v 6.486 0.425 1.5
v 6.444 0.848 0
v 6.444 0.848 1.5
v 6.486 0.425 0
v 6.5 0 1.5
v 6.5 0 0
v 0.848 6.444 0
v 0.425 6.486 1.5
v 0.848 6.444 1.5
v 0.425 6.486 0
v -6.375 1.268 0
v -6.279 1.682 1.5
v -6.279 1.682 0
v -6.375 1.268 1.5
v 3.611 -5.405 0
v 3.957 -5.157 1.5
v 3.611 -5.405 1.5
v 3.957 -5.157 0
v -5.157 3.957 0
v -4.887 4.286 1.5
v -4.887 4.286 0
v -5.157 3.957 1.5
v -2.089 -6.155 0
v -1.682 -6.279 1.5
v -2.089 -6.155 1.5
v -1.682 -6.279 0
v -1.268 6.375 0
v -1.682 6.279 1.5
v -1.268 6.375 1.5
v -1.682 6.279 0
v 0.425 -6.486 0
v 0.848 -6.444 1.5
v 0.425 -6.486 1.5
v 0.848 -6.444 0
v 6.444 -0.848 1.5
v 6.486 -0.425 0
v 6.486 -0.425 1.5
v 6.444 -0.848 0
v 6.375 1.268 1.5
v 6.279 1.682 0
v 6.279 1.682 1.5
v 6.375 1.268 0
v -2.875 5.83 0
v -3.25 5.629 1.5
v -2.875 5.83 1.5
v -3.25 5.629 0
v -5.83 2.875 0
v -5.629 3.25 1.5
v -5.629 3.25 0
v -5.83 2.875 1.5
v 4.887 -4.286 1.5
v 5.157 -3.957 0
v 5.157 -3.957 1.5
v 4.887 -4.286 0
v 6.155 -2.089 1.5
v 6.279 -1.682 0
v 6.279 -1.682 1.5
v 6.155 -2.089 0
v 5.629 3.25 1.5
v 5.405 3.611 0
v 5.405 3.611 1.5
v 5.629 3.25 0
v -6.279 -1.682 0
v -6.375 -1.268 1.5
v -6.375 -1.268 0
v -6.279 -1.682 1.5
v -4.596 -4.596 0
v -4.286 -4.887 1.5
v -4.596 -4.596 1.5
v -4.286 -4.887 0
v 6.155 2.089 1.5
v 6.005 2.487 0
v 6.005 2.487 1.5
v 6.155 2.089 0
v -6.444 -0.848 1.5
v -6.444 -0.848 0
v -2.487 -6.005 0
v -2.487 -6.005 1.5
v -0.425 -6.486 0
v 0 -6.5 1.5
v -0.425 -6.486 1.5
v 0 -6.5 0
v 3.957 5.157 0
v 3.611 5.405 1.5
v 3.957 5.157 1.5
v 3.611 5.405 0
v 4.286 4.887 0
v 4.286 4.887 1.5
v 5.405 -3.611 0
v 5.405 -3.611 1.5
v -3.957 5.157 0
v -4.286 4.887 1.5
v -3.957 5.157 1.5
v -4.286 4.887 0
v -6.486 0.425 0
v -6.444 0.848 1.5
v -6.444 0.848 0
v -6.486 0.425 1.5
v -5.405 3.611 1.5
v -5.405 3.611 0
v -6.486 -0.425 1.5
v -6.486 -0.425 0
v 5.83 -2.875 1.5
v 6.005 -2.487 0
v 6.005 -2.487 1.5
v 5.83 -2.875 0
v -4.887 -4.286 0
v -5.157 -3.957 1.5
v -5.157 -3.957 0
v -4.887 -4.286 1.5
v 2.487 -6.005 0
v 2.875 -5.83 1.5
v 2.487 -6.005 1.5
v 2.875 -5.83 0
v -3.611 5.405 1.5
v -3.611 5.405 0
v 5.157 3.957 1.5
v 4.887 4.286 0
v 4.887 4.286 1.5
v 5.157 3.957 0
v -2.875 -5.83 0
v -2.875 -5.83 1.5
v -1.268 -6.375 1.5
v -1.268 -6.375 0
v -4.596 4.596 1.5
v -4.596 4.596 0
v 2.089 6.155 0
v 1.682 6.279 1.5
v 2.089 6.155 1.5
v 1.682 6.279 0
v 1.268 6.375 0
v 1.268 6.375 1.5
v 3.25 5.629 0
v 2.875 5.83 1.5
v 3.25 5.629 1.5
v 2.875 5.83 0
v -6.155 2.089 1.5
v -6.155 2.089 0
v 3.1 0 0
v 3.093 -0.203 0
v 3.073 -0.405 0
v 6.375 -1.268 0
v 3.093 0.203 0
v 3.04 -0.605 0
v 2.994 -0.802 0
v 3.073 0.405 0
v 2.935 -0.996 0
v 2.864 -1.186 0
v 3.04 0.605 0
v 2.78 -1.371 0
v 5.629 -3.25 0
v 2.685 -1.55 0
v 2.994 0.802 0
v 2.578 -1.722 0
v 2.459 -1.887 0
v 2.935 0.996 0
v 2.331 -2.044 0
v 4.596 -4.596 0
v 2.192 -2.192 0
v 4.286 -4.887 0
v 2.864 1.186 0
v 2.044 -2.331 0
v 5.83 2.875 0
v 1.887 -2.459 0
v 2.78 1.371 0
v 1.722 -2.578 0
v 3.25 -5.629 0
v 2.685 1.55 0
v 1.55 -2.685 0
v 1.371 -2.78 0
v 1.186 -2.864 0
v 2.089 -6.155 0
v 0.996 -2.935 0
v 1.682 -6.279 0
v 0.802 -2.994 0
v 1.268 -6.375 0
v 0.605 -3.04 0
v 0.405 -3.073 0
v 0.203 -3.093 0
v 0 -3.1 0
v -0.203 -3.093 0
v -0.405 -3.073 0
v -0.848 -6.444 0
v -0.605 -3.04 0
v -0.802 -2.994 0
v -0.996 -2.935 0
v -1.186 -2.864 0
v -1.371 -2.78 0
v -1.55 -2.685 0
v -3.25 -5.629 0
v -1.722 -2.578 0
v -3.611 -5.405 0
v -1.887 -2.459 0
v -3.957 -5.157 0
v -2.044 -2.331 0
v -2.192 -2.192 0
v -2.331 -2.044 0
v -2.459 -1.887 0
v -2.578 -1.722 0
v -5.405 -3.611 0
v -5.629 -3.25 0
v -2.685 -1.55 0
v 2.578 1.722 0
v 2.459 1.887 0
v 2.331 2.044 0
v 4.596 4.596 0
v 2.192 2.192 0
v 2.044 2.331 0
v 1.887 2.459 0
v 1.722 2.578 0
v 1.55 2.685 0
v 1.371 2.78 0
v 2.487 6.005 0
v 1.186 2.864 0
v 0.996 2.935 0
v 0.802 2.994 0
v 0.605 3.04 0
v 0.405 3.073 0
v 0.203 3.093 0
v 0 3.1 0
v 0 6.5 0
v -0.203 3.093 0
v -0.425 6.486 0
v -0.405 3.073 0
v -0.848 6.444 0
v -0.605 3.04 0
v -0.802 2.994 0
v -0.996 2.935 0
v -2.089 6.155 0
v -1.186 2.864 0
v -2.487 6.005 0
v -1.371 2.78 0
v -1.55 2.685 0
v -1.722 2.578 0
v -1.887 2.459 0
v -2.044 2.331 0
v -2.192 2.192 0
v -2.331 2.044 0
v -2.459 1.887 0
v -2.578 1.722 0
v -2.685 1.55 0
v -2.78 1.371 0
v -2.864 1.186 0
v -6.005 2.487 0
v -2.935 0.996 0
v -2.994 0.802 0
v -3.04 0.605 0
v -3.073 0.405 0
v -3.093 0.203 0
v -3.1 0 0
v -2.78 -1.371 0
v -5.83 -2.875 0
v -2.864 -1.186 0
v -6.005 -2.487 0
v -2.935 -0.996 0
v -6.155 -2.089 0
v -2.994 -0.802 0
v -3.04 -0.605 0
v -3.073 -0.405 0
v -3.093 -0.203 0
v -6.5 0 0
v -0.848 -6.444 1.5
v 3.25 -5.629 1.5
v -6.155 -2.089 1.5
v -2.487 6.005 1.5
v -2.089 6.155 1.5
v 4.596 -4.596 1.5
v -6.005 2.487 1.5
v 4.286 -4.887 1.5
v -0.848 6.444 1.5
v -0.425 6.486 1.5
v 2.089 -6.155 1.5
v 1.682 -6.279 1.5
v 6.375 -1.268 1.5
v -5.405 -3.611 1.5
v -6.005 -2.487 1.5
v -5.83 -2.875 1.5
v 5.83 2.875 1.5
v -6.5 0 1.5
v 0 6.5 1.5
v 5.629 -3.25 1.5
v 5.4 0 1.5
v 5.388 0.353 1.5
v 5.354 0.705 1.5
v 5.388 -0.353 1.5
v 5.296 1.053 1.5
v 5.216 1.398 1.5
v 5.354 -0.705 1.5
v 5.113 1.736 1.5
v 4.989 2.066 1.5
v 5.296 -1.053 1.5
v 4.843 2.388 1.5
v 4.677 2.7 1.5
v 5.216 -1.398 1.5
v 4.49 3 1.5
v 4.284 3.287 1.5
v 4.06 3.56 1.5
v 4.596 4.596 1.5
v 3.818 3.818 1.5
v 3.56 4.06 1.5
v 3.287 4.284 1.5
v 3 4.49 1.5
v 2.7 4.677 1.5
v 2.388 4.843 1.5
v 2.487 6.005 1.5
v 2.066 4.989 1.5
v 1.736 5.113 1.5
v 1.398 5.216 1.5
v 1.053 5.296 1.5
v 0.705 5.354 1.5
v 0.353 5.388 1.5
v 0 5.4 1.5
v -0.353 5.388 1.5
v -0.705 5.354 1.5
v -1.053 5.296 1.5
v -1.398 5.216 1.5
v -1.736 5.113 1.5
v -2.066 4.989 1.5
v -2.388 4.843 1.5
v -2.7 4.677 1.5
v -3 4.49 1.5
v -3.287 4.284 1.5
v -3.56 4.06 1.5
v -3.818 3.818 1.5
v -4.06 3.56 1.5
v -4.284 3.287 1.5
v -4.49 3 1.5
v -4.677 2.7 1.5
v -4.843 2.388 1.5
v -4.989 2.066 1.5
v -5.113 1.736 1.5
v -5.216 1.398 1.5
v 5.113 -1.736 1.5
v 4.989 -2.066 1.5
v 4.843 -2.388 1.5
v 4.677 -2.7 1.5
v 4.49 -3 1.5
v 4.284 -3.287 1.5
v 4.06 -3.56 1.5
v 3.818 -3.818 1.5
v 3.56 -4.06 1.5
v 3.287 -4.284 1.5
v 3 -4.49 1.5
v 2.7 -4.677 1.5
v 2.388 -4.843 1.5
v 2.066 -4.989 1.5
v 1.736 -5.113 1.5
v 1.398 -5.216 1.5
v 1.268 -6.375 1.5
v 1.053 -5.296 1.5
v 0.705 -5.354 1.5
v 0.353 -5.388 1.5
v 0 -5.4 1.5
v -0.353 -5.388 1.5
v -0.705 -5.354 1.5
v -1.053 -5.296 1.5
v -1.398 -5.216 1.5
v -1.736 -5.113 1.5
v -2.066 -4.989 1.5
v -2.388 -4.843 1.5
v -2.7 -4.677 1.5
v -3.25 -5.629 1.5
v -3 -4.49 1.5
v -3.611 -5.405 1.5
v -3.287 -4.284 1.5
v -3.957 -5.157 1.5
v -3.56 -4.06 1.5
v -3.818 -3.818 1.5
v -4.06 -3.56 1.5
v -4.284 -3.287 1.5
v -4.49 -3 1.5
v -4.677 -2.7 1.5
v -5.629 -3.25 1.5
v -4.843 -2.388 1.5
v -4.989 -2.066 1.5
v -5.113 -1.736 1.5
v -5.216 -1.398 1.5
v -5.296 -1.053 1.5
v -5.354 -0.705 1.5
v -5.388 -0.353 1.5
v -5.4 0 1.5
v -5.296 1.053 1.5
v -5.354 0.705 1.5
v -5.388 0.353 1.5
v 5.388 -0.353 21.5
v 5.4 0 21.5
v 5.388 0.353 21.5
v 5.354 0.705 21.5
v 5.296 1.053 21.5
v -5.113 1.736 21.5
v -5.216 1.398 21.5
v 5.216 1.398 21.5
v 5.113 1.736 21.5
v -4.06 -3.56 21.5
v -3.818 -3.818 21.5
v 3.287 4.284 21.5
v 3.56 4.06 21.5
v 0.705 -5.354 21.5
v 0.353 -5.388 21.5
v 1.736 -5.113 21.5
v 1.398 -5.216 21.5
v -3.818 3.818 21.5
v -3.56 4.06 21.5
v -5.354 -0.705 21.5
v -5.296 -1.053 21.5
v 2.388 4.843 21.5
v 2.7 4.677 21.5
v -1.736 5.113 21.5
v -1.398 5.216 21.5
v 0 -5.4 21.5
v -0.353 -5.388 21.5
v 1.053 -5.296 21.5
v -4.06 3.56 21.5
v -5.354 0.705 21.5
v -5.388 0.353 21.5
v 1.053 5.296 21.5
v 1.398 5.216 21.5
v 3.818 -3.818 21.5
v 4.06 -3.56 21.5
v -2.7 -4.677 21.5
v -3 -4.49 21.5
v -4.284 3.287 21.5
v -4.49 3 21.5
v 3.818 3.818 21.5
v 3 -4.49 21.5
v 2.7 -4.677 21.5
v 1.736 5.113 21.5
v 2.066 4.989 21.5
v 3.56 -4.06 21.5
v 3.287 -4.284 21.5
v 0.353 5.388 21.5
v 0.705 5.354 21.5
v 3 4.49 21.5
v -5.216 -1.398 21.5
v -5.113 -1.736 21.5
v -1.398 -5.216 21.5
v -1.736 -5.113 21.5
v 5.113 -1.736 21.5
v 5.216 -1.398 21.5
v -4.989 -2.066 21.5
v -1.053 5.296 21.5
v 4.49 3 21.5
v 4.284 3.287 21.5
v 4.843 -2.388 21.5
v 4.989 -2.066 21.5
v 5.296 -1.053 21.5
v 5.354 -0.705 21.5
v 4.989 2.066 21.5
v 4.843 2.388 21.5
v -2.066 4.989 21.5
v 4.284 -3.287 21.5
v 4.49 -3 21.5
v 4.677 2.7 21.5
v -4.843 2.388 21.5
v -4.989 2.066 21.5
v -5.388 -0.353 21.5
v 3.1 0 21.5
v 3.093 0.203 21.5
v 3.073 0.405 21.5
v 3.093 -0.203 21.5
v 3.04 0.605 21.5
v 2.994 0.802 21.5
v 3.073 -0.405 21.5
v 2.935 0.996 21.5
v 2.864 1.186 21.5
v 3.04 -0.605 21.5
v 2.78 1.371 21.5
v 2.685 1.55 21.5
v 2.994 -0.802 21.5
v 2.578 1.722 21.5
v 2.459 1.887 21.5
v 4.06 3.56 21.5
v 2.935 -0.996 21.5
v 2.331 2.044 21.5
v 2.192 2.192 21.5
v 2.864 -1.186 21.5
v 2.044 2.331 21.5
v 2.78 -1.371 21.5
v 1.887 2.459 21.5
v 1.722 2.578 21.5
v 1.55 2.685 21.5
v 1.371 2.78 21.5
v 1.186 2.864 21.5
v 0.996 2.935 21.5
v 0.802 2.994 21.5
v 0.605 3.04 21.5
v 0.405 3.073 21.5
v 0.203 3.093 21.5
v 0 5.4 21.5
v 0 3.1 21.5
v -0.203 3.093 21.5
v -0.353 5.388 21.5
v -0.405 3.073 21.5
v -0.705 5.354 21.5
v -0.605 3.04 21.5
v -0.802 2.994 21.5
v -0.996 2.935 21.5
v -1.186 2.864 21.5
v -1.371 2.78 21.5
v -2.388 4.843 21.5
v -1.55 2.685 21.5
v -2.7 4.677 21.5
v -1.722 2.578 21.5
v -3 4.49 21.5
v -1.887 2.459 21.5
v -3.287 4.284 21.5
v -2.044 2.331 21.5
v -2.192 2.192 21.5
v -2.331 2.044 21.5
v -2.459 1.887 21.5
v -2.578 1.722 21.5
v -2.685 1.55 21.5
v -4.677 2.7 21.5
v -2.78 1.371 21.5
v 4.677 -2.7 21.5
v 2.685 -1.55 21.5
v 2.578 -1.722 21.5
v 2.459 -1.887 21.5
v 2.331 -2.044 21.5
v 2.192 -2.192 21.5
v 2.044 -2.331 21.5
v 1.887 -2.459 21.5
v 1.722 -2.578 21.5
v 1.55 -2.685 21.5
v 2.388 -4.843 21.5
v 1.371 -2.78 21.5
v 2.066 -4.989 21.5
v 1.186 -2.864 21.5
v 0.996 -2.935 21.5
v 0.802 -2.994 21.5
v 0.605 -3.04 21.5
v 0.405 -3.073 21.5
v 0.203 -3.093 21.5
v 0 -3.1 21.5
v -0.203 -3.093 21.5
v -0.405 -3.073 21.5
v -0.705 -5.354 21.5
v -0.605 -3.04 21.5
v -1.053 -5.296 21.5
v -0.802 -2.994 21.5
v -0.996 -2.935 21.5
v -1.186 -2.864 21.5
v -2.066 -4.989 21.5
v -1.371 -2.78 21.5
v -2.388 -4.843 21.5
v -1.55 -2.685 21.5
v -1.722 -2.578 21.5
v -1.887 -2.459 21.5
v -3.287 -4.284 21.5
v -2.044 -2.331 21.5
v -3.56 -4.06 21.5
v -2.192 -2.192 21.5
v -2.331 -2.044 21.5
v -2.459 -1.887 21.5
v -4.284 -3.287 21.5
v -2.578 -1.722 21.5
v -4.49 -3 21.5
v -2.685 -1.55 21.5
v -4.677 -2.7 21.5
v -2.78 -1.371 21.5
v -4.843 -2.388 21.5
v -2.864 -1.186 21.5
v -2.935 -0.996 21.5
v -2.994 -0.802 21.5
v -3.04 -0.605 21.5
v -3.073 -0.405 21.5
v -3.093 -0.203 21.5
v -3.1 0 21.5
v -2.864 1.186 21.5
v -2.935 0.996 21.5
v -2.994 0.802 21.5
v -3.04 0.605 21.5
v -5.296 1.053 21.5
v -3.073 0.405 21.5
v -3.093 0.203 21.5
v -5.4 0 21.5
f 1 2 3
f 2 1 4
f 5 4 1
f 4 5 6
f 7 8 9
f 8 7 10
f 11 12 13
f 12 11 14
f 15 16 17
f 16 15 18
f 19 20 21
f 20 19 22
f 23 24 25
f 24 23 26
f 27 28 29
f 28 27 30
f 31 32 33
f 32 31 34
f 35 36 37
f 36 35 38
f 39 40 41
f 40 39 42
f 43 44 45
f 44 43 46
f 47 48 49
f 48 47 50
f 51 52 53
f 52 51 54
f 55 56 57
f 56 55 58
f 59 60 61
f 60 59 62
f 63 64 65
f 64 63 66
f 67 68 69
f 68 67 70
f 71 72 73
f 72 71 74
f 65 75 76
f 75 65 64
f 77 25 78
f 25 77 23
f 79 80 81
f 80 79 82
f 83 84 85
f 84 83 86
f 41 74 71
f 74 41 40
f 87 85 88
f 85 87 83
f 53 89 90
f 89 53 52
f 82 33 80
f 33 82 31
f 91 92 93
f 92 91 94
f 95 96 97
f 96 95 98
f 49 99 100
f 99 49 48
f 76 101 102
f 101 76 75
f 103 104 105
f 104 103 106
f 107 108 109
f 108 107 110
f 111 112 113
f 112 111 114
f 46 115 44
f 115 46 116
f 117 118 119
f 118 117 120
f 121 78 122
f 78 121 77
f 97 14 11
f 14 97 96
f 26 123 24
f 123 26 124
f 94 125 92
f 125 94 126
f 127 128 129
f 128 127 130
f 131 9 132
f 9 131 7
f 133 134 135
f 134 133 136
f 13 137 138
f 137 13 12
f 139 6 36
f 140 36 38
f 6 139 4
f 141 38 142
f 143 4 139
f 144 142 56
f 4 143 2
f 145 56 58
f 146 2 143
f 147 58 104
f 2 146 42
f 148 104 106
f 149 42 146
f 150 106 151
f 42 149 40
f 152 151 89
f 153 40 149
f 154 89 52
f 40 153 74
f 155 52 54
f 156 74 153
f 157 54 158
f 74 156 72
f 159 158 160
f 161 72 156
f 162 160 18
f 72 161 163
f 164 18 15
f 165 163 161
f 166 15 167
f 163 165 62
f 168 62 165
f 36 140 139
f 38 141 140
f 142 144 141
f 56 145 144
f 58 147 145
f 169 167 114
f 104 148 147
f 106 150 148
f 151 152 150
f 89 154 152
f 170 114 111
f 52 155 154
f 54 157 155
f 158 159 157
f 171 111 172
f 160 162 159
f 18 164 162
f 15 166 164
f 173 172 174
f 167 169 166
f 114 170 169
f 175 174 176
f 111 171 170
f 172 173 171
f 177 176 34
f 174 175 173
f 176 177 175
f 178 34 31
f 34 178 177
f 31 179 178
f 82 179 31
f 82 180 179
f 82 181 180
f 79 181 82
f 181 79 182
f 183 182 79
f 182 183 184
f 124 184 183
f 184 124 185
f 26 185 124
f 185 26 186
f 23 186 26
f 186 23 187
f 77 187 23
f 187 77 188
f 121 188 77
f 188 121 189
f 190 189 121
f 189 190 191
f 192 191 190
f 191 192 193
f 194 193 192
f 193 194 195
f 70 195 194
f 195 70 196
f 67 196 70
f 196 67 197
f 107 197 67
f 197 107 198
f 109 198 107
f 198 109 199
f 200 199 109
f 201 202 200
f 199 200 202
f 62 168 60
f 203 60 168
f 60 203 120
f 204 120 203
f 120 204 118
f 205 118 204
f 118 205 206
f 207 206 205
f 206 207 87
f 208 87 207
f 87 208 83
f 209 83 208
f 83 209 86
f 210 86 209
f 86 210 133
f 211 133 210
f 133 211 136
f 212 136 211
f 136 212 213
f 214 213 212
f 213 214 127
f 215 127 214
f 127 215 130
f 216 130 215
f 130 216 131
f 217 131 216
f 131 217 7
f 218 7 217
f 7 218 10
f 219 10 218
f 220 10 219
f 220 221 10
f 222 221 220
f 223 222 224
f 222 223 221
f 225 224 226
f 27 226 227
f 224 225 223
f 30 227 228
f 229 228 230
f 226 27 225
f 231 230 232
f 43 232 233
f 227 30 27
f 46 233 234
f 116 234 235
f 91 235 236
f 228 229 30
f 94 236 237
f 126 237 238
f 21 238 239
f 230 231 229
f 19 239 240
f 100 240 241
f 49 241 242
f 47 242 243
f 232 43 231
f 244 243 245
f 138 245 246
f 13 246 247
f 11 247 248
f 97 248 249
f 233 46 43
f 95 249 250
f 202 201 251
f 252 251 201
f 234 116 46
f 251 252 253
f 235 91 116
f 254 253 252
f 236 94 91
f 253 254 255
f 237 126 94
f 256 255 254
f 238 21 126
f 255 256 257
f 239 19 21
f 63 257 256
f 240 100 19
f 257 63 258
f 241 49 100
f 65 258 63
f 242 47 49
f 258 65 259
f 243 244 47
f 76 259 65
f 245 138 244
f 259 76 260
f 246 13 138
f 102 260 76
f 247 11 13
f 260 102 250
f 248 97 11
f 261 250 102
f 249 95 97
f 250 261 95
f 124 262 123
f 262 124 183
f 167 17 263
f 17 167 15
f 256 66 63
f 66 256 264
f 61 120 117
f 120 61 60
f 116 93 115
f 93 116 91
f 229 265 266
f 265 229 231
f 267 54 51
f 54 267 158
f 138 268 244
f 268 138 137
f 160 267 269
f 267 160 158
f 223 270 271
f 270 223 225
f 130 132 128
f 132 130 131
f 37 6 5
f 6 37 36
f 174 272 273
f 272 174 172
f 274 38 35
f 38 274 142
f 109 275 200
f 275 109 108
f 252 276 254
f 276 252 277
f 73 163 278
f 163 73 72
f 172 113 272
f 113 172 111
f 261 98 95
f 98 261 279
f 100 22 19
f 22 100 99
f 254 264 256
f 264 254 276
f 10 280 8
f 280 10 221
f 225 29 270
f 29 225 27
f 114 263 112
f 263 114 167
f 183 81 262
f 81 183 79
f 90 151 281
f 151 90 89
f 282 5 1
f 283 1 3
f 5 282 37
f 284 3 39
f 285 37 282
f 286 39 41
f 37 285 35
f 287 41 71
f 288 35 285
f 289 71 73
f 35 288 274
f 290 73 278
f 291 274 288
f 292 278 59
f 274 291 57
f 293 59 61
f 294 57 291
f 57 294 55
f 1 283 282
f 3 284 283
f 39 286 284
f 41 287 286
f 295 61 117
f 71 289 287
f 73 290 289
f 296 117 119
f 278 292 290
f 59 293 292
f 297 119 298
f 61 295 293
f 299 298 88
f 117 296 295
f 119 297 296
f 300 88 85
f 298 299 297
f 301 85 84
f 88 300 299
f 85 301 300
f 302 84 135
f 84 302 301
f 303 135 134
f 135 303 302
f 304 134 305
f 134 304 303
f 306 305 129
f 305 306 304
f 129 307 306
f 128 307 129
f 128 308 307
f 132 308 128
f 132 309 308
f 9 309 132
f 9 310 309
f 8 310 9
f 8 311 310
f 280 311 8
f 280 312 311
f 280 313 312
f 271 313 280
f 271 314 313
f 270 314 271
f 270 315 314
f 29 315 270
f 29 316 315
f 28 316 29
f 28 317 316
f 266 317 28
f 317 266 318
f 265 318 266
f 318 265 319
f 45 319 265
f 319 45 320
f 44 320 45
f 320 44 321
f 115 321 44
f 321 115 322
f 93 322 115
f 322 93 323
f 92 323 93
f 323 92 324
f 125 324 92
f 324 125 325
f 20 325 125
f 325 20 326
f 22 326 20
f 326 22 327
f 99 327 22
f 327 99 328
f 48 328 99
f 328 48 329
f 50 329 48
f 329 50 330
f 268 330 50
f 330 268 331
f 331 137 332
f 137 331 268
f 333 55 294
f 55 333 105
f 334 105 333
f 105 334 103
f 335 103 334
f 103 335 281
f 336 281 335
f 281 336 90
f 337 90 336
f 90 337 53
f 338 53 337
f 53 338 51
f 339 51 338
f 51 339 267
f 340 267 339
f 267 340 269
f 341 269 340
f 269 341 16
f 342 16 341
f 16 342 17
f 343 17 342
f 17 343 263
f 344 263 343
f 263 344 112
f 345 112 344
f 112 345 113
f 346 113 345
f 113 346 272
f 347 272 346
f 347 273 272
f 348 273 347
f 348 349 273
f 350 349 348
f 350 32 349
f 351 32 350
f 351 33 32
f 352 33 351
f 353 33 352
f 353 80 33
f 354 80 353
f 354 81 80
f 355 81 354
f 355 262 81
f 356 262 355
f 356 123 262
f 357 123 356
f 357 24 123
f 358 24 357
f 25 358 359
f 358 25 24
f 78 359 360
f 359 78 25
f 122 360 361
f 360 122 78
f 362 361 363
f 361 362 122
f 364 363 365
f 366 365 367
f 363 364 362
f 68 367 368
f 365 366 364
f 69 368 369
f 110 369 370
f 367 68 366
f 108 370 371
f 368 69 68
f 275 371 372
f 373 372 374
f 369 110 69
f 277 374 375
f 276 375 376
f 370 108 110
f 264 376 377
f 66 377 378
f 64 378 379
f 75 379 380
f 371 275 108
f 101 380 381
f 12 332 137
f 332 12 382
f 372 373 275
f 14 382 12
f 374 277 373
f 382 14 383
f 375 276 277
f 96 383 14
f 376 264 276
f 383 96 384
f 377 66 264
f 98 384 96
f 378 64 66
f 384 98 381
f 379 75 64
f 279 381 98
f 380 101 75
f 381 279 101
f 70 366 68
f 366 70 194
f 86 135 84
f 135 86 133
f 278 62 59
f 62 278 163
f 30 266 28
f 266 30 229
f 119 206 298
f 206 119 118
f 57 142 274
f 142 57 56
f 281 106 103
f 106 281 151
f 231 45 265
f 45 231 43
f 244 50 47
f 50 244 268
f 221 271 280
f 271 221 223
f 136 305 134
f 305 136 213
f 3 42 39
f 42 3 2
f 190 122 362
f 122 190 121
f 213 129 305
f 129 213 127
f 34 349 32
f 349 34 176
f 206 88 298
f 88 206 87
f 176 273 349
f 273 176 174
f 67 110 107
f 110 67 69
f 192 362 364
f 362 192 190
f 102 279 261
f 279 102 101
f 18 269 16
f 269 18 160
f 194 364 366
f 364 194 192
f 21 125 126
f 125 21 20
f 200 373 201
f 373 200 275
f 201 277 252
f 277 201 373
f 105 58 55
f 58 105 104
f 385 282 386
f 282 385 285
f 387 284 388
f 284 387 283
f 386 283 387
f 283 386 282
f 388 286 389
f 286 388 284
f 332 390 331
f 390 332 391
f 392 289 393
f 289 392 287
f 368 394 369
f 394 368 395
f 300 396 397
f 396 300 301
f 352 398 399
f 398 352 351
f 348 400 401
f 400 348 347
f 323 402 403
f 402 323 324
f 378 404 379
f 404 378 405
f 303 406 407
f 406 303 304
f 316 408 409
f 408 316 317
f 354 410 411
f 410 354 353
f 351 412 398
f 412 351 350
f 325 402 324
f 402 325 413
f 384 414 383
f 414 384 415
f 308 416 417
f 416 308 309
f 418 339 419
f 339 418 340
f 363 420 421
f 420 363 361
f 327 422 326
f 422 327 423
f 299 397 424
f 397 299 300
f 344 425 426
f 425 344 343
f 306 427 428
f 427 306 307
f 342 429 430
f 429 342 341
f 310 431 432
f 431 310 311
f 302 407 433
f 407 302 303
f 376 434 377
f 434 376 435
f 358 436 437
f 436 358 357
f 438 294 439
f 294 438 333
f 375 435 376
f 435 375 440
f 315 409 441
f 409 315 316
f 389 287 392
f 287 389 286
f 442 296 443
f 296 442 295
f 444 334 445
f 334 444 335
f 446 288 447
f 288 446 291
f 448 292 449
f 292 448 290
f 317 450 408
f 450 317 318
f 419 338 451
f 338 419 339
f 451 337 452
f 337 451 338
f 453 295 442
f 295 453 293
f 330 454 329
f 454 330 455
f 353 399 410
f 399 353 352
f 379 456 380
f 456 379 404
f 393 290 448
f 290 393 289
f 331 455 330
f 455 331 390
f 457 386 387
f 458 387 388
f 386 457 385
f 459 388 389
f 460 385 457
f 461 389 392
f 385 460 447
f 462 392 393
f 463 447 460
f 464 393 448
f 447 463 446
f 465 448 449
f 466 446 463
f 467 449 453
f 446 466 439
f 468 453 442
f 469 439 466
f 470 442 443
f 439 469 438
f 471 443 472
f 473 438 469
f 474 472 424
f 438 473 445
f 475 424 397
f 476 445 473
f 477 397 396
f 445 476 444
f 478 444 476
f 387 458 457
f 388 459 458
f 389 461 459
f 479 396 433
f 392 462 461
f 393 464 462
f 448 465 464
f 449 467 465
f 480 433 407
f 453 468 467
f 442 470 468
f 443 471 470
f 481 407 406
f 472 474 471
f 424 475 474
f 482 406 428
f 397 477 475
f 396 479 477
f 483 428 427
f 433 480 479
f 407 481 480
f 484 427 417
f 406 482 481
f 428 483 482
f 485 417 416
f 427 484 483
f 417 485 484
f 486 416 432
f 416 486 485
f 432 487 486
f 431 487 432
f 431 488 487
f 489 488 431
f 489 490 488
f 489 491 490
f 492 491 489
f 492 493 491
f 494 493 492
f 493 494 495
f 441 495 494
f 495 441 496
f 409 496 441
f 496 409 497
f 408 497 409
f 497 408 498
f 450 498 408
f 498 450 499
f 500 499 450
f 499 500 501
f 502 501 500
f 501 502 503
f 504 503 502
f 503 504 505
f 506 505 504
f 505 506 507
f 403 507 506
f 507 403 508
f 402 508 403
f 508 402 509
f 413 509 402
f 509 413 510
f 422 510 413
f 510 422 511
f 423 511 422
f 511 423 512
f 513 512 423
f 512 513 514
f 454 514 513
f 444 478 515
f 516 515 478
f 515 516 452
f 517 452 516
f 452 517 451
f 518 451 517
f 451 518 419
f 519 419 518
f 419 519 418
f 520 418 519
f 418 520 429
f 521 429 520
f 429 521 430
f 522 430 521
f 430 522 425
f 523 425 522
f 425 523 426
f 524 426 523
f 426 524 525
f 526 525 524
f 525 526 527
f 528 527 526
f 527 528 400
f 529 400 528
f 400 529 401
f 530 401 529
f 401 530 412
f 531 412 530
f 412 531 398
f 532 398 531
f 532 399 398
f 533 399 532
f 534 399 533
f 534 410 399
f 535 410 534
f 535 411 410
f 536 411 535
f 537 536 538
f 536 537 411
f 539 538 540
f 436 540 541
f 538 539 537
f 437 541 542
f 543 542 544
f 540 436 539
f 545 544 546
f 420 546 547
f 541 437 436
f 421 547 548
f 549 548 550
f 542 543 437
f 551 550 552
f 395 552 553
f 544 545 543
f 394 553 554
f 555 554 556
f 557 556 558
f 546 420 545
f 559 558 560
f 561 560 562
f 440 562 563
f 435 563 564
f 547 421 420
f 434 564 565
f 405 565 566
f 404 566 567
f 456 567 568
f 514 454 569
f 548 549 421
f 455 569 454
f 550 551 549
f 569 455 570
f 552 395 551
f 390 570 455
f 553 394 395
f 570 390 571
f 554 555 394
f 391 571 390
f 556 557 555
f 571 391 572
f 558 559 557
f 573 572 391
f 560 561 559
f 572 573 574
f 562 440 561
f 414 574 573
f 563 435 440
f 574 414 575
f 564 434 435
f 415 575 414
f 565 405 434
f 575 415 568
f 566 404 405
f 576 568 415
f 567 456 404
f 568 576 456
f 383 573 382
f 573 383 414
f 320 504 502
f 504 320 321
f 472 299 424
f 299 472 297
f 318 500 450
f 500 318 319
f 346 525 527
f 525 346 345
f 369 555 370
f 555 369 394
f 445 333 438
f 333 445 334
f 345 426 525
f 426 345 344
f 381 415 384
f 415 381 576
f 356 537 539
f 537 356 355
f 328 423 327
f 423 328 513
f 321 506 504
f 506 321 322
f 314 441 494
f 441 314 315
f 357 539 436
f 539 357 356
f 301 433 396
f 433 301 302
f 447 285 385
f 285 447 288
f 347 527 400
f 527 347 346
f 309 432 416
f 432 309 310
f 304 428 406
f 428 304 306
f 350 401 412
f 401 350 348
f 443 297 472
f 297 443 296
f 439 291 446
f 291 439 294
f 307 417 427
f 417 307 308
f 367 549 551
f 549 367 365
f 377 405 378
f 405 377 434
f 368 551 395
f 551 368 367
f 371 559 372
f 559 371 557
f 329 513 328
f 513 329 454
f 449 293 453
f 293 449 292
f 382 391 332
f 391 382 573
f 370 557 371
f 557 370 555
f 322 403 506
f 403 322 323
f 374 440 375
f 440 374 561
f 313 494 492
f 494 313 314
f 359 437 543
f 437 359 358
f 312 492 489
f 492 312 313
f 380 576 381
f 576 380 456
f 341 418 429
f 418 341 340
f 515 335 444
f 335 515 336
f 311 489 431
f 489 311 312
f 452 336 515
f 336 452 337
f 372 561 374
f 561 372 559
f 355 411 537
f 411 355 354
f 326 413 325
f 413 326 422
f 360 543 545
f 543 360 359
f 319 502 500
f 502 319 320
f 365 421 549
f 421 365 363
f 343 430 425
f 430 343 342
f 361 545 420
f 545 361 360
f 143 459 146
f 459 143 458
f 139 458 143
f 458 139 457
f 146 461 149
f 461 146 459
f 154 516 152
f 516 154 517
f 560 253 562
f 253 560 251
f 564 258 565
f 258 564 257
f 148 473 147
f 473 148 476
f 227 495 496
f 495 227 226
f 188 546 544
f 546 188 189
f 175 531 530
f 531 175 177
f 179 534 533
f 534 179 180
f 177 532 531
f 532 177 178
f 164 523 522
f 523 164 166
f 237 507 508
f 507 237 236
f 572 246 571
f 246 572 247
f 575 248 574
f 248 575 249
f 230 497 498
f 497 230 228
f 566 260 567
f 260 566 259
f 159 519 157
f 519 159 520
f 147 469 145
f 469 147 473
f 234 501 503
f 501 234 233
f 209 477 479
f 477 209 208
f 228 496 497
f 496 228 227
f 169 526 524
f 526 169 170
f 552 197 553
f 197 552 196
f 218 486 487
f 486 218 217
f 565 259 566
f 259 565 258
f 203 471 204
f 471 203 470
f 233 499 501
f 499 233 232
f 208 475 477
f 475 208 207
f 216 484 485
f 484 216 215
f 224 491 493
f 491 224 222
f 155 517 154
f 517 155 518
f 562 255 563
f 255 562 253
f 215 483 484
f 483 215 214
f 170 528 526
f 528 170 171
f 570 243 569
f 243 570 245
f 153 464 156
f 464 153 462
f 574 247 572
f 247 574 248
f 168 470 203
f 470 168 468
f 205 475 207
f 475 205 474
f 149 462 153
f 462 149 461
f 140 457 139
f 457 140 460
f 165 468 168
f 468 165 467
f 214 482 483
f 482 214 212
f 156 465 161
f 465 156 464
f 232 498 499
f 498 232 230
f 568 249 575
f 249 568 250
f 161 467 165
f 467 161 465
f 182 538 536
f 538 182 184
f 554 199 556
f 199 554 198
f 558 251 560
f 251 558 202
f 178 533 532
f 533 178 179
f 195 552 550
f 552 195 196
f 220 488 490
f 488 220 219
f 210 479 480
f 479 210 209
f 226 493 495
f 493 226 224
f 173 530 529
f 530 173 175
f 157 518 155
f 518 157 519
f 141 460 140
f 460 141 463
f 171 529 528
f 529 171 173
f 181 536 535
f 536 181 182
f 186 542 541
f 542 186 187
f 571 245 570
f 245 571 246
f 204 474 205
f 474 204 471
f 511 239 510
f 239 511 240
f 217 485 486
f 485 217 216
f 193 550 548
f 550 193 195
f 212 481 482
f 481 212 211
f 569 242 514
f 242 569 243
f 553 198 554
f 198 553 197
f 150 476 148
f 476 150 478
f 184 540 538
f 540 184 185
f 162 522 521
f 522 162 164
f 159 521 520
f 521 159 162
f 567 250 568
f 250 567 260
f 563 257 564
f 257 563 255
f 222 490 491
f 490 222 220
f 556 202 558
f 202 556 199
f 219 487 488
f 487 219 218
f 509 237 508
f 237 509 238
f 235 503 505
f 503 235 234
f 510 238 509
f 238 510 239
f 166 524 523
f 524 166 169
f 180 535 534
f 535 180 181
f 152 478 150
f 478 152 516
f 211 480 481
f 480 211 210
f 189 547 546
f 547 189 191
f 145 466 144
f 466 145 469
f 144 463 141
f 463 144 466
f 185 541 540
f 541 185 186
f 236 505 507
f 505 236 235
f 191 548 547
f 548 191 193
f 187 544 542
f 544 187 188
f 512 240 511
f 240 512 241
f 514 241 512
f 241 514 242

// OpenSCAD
// Adapter sleeve: 0.2 mL PCR tube fits into a 1.5 mL tube rack hole
// Print orientation: collar on the bed, sleeve body pointing up (+Z)

$fn = 96;

// ---- Dimensions (mm) ----
collar_d        = 13;    // collar outer diameter
collar_h        = 1.5;   // collar thickness (z = 0 to 1.5)
sleeve_od       = 10.8;  // sleeve body outer diameter
sleeve_top_z    = 21.5;  // top of sleeve body (absolute Z)
bore_d          = 6.2;   // through-bore diameter
eps             = 0.5;   // cutter overshoot past faces

total_h = sleeve_top_z;  // overall height (21.5 mm)

// ---- Model ----
difference() {
    union() {
        // Collar
        cylinder(d = collar_d, h = collar_h);
        // Sleeve body (overlaps slightly into collar for a clean union)
        translate([0, 0, collar_h - 0.01])
            cylinder(d = sleeve_od, h = total_h - collar_h + 0.01);
    }
    // Through-bore
    translate([0, 0, -eps])
        cylinder(d = bore_d, h = total_h + 2 * eps);
}
